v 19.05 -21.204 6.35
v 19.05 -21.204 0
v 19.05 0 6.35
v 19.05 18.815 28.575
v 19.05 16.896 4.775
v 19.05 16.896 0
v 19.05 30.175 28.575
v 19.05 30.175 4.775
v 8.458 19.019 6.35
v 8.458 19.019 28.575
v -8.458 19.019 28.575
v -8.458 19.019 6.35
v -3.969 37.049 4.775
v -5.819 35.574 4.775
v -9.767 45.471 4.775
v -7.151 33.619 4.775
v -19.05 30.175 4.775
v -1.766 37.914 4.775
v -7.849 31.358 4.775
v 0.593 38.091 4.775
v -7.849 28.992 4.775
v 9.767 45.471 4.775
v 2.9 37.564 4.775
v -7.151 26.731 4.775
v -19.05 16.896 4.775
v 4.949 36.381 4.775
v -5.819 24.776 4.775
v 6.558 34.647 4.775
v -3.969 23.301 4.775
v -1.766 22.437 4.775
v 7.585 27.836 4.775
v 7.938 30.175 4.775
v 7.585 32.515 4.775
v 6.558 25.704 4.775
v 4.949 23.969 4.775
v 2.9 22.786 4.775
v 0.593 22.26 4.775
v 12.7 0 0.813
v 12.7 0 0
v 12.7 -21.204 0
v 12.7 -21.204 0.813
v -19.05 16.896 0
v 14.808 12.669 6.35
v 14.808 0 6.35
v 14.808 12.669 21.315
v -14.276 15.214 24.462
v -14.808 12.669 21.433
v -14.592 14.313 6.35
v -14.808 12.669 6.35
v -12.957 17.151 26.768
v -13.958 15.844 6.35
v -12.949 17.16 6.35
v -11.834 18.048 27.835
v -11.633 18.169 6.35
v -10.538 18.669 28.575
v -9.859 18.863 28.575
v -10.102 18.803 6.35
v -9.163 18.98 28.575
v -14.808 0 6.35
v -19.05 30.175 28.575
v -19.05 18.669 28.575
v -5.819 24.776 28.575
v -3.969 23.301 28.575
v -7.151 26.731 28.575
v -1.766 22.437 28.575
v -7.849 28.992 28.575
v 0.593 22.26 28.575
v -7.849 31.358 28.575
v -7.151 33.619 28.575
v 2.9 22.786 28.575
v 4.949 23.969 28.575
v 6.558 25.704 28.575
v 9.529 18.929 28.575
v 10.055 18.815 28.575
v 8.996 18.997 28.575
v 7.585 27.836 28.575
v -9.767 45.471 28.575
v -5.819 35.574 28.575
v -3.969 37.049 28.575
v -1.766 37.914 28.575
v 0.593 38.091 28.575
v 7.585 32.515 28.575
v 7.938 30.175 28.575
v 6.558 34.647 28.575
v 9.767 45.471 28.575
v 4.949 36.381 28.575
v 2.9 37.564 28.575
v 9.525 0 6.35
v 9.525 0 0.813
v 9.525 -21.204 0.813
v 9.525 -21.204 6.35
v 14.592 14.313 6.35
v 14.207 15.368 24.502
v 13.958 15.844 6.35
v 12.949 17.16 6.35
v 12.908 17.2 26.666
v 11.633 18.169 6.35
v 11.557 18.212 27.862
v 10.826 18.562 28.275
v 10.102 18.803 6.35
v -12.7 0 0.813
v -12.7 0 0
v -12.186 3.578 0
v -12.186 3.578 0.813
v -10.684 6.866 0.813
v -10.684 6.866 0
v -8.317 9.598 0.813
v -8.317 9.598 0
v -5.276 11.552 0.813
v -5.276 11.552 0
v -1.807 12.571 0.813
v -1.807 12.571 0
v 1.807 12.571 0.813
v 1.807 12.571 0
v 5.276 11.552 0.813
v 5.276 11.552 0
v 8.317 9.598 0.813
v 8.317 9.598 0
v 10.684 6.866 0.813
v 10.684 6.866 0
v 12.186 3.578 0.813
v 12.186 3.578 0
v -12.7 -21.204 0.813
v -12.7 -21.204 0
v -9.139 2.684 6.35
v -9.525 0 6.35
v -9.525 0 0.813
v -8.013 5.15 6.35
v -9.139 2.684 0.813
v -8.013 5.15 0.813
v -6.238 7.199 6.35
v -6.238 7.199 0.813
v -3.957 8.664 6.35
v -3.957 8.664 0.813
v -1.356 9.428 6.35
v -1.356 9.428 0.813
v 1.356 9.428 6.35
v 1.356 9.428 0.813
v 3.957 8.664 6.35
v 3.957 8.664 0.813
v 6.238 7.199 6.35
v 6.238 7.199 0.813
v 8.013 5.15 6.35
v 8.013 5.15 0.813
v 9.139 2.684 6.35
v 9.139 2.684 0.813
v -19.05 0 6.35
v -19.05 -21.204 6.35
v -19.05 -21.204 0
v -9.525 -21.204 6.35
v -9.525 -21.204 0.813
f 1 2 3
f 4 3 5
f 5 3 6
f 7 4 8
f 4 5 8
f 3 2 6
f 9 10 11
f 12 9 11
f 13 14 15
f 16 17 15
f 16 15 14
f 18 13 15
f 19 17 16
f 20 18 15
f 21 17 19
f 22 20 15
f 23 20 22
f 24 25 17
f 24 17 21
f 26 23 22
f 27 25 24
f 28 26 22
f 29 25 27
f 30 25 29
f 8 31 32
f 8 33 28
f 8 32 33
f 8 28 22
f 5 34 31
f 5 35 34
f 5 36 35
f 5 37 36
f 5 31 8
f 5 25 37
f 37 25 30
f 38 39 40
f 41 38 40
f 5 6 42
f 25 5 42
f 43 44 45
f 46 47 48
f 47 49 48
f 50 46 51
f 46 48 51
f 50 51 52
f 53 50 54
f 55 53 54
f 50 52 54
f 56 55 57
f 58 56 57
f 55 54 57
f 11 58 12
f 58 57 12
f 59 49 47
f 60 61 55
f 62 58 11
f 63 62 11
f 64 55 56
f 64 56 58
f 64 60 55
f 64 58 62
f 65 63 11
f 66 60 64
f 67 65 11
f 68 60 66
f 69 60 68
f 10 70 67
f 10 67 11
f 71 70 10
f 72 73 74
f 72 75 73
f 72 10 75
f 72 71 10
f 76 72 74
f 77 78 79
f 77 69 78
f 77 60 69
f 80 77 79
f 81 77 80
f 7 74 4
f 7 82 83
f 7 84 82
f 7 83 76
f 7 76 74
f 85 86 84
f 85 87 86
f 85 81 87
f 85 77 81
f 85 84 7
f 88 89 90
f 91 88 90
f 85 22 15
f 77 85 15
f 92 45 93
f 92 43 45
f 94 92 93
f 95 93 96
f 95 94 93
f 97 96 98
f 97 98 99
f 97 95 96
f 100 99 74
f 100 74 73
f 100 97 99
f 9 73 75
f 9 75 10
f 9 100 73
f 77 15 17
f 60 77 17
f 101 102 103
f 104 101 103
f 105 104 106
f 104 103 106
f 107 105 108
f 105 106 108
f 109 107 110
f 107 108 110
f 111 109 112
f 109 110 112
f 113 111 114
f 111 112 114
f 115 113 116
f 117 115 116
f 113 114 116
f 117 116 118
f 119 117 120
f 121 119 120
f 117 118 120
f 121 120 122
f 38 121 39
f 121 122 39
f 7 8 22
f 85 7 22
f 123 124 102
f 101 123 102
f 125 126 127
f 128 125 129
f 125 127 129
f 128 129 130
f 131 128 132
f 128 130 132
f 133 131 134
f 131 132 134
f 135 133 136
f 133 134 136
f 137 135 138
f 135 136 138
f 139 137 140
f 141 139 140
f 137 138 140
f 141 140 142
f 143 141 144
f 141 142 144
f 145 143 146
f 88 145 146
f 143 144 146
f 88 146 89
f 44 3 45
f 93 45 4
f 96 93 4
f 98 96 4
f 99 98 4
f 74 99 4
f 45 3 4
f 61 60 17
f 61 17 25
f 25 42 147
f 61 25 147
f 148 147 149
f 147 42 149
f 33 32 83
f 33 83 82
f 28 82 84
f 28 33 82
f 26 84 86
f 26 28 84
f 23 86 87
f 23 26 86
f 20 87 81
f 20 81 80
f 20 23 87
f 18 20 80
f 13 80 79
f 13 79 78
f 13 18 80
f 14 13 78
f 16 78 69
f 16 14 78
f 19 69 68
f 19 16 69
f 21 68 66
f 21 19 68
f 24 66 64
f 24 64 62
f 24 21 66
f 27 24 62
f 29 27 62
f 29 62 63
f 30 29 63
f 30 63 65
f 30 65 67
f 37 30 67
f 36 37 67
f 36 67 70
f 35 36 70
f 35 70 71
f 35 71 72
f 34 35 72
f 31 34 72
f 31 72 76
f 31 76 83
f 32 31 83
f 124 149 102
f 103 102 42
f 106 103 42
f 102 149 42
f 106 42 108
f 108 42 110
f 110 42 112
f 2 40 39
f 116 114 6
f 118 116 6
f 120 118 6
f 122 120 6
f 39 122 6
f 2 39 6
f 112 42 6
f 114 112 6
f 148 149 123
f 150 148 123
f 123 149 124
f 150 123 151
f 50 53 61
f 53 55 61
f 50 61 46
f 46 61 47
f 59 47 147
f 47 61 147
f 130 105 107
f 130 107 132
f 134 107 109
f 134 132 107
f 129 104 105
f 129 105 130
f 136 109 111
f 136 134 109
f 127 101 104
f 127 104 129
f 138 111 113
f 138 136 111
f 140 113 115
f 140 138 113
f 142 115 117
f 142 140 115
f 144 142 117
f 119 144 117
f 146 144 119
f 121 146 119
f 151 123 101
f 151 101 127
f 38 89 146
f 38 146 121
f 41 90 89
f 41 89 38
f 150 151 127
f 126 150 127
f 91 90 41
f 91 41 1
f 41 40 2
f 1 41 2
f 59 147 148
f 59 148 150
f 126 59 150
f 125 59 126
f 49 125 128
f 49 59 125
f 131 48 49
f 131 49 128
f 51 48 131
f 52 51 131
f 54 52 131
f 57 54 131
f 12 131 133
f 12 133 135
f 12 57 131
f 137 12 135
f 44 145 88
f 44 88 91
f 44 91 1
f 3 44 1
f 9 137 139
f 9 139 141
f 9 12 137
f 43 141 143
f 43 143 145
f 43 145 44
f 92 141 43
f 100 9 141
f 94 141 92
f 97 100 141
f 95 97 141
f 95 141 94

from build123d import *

# Parameters (mm, degrees)
F0_R      = 7.9375
F1_DEPTH  = 28.575
F3_DEPTH  = 0.8128
F2_R      = 7.9375
F4_DEPTH  = 4.7752
F6_DEPTH  = 22.225
F8_DEPTH  = 25.4
F10_DEPTH = 25.4
F11_R     = 6.35


with BuildPart() as f1:
    # F0 (on Top) → F1 (new body)
    with BuildSketch(Plane.XY):
        with BuildLine():
            ThreePointArc((-9.525, 0), (0, 9.525), (9.525, 0))
            Line((9.525, 0), (9.525, -21.203784))
            Line((9.525, -21.203784), (19.05, -21.203784))
            Line((19.05, -21.203784), (19.05, 30.1752))
            Line((19.05, 30.1752), (9.767071, 45.471216))
            Line((9.767071, 45.471216), (-9.767071, 45.471216))
            Line((-9.767071, 45.471216), (-19.05, 30.1752))
            Line((-19.05, 30.1752), (-19.05, -21.203784))
            Line((-19.05, -21.203784), (-9.525, -21.203784))
            Line((-9.525, -21.203784), (-9.525, 0))
        make_face()
        with Locations((0, 30.1752)):
            Circle(F0_R, mode=Mode.SUBTRACT)
    extrude(amount=F1_DEPTH)

    # F2 (on face) → F3 (cut)
    with BuildSketch(Plane(origin=(0, 0, 0), x_dir=(1, 0, 0), z_dir=(0, 0, -1))):
        with BuildLine():
            Line((-12.7, 21.203784), (-12.7, 0))
            ThreePointArc((-12.7, 0), (0, -12.7), (12.7, 0))
            Line((12.7, 0), (12.7, 21.203784))
            Line((12.7, 21.203784), (9.525, 21.203784))
            Line((9.525, 21.203784), (9.525, 0))
            ThreePointArc((9.525, 0), (0, -9.525), (-9.525, 0))
            Line((-9.525, 0), (-9.525, 21.203784))
            Line((-9.525, 21.203784), (-12.7, 21.203784))
        make_face()
    extrude(amount=-F3_DEPTH, mode=Mode.SUBTRACT)

    # F2 (on face) → F4 (cut)
    with BuildSketch(Plane(origin=(0, 0, 0), x_dir=(1, 0, 0), z_dir=(0, 0, -1))):
        Polygon((19.05, -16.896216), (-19.05, -16.896216), (-19.05, -30.1752), (-9.767071, -45.471216), (9.767071, -45.471216), (19.05, -30.1752), align=None)
        with Locations((0, -30.1752)):
            Circle(F2_R, mode=Mode.SUBTRACT)
    extrude(amount=-F4_DEPTH, mode=Mode.SUBTRACT)

    # F5 (on face) → F6 (cut)
    with BuildSketch(Plane.XY.offset(28.575)):
        with BuildLine():
            Line((-14.808481, 19.019462), (-14.808481, 0))
            Line((-14.808481, 0), (-19.05, 0))
            Line((-19.05, 0), (-19.05, -21.203784))
            Line((-19.05, -21.203784), (-9.525, -21.203784))
            Line((-9.525, -21.203784), (-9.525, 0))
            ThreePointArc((-9.525, 0), (0, 9.525), (9.525, 0))
            Line((9.525, 0), (9.525, -21.203784))
            Line((9.525, -21.203784), (19.05, -21.203784))
            Line((19.05, -21.203784), (19.05, 0))
            Line((19.05, 0), (14.808481, 0))
            Line((14.808481, 0), (14.808481, 19.019462))
            Line((14.808481, 19.019462), (-14.808481, 19.019462))
        make_face()
    extrude(amount=-F6_DEPTH, mode=Mode.SUBTRACT)

    # F7 (on face) → F8 (cut)
    with BuildSketch(Plane.YZ.offset(19.05)):
        Polygon((0, 28.575), (0, 6.35), (18.815449, 28.575), align=None)
    extrude(amount=-F8_DEPTH, mode=Mode.SUBTRACT)

    # F9 (on face) → F10 (cut)
    with BuildSketch(Plane(origin=(-19.05, 0, 0), x_dir=(0, -1, 0), z_dir=(-1, 0, 0))):
        Polygon((-18.669238, 28.575), (0, 6.35), (0, 28.575), align=None)
    extrude(amount=-F10_DEPTH, mode=Mode.SUBTRACT)

    # F11
    f11_edges = [f1.edges().sort_by_distance(p)[0] for p in [
        (-14.808481, 19.019462, 17.4625),
        (14.808481, 19.019462, 17.4625),
    ]]
    fillet(f11_edges, radius=F11_R)


solid = f1.part
